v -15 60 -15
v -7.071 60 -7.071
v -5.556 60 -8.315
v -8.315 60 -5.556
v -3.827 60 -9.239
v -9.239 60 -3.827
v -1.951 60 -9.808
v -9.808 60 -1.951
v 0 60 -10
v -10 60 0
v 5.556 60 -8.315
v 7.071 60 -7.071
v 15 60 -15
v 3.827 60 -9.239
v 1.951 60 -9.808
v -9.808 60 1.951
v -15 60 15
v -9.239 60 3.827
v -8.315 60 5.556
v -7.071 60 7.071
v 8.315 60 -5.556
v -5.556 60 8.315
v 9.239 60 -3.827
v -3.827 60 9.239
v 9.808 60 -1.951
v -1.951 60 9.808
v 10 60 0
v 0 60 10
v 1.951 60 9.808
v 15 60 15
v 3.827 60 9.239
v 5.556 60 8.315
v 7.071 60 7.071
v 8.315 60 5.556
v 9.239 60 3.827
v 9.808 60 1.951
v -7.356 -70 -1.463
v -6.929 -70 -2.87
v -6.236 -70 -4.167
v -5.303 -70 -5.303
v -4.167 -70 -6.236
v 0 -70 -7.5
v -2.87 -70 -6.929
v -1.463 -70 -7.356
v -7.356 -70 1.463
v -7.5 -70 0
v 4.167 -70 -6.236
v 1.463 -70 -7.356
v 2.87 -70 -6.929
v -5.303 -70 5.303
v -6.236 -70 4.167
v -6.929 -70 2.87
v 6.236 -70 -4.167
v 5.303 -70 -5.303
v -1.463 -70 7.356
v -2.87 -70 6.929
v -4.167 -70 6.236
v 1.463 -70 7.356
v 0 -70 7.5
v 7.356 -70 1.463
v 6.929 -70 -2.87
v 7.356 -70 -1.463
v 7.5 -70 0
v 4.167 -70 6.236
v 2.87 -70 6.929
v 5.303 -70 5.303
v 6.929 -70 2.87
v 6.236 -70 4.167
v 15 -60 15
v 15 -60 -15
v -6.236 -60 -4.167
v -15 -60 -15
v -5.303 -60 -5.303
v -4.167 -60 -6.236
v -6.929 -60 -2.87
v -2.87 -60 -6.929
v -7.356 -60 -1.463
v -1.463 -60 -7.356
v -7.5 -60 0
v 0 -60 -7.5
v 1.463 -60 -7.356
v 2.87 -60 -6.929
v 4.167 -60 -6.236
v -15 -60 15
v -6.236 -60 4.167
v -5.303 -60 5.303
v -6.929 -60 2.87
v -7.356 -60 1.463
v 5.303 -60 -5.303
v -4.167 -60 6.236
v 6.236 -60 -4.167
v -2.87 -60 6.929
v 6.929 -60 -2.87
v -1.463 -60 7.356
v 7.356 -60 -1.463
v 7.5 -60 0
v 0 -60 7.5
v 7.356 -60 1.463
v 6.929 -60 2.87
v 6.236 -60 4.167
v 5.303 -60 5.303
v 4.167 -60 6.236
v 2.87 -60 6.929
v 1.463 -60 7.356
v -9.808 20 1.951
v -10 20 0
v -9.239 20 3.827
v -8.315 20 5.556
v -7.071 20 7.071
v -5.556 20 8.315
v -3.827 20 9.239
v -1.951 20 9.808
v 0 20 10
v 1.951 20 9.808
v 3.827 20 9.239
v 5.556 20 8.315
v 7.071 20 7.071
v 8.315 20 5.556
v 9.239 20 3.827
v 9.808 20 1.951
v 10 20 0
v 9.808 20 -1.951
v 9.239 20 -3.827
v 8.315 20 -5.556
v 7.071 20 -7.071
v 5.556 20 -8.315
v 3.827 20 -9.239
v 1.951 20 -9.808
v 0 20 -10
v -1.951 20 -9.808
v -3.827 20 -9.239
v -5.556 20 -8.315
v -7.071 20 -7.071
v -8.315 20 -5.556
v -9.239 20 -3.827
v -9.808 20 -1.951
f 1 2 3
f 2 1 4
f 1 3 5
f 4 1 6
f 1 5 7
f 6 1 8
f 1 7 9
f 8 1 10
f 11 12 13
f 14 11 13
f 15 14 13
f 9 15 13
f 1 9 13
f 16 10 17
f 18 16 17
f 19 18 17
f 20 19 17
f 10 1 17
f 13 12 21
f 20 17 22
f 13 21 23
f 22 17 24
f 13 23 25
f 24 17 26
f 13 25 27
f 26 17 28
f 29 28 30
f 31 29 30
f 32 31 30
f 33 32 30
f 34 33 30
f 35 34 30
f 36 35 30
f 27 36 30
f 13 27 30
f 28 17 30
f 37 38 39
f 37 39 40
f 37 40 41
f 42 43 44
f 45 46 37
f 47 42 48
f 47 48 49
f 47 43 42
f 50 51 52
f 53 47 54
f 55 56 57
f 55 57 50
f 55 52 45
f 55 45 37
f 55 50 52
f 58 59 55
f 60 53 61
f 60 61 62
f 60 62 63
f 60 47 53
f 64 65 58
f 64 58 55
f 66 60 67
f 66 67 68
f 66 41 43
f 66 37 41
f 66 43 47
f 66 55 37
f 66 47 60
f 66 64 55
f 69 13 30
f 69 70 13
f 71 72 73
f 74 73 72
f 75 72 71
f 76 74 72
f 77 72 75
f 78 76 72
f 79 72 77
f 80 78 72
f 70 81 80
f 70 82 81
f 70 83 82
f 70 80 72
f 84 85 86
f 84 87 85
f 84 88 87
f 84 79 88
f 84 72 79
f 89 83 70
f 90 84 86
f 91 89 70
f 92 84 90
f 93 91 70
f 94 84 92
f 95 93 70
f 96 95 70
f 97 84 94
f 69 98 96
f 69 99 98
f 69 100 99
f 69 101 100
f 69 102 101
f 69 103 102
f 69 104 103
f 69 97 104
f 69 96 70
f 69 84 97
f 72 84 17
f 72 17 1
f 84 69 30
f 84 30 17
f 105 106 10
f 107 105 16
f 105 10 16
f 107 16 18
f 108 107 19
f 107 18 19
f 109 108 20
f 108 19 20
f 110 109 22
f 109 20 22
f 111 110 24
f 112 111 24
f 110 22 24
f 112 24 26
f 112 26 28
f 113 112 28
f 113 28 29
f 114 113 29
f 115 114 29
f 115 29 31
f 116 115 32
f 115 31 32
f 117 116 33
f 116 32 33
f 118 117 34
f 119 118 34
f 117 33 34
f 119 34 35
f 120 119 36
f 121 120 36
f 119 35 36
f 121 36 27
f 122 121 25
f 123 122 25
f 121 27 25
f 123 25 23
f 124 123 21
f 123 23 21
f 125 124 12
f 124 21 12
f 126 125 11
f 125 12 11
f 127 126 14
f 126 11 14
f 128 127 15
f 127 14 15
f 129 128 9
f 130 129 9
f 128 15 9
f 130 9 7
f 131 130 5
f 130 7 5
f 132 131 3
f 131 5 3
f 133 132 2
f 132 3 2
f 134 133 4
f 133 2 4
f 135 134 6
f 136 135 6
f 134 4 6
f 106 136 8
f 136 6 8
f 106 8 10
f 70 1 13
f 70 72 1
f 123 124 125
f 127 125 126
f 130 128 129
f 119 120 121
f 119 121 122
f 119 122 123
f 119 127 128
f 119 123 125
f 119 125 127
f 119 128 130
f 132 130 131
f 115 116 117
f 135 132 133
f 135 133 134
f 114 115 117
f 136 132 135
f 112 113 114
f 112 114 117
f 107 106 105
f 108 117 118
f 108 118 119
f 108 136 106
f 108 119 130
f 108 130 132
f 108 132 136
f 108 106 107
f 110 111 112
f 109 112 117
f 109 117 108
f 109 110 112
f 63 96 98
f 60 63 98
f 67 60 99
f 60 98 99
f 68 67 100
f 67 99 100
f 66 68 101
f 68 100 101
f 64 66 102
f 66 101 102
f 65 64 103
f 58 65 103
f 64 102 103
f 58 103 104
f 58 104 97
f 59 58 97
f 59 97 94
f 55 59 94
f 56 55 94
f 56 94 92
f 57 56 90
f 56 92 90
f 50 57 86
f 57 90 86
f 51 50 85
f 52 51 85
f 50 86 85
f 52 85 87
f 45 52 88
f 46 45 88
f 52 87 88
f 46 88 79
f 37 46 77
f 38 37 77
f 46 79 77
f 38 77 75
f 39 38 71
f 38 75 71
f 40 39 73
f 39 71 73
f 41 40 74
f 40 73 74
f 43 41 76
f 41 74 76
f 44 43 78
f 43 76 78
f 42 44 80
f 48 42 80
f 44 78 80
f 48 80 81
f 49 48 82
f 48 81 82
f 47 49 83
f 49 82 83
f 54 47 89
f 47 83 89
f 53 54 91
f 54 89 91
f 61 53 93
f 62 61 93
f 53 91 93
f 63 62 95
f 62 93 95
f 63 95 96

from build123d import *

# Parameters (mm, degrees)
F1_DEPTH = 60
F2_R     = 7.5
F3_DEPTH = 10
F4_R     = 10
F5_DEPTH = 40


with BuildPart() as f1:
    # F0 (on Front) → F1 (new body, symmetric)
    with BuildSketch(Plane.XZ):
        Polygon((15, -15), (15, 0), (15, 15), (0, 15), (-15, 15), (-15, -15), align=None)
    extrude(amount=F1_DEPTH, both=True)

    # F2 (on face) → F3 (join)
    with BuildSketch(Plane.XZ.offset(60)):
        Circle(F2_R)
    extrude(amount=F3_DEPTH)

    # F4 (on face) → F5 (cut)
    with BuildSketch(Plane(origin=(0, 60, 0), x_dir=(-1, 0, 0), z_dir=(0, 1, 0))):
        Circle(F4_R)
    extrude(amount=-F5_DEPTH, mode=Mode.SUBTRACT)


solid = f1.part
